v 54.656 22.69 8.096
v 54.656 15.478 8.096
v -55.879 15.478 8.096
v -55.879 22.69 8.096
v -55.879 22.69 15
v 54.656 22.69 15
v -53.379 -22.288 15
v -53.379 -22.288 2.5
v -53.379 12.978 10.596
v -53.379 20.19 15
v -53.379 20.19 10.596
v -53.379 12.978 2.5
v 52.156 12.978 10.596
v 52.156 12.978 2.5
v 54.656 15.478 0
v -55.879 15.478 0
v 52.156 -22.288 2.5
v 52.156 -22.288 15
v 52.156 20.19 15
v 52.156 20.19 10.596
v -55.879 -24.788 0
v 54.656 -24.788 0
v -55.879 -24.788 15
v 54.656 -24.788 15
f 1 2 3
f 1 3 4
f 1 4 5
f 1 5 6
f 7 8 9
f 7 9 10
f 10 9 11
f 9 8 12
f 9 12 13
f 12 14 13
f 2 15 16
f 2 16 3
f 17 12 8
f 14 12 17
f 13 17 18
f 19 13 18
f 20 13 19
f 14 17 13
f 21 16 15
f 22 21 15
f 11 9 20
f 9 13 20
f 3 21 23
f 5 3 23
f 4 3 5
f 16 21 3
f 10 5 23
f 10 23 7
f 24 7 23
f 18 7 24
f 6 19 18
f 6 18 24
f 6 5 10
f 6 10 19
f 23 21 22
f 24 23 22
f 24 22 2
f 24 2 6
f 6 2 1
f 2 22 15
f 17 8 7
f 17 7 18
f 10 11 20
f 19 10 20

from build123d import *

# Parameters (mm, degrees)
F0_W     = 110.5350777507
F0_H     = 47.4778749049
F1_DEPTH = 15
F2_W     = 7.2117066011
F2_H     = 8.0962125212
F3_DEPTH = 110.5350777507
F4_T     = -2.5


with BuildPart() as f1:
    # F0 (on Top) → F1 (new body)
    with BuildSketch(Plane.XY):
        with Locations((-0.6117708981, -1.0488014668)):
            Rectangle(F0_W, F0_H)
    extrude(amount=F1_DEPTH)

    # F2 (on face) → F3 (cut, through all)
    with BuildSketch(Plane.YZ.offset(54.6557679772)):
        with Locations((19.0842826851, 4.0481062606)):
            Rectangle(F2_W, F2_H)
    extrude(amount=-F3_DEPTH, mode=Mode.SUBTRACT)

    # F4
    f4_openings = [f1.faces().sort_by_distance(p)[0] for p in [
        (-0.611771, -1.048801, 15),
    ]]
    offset(amount=F4_T, openings=f4_openings, kind=Kind.INTERSECTION)


solid = f1.part
